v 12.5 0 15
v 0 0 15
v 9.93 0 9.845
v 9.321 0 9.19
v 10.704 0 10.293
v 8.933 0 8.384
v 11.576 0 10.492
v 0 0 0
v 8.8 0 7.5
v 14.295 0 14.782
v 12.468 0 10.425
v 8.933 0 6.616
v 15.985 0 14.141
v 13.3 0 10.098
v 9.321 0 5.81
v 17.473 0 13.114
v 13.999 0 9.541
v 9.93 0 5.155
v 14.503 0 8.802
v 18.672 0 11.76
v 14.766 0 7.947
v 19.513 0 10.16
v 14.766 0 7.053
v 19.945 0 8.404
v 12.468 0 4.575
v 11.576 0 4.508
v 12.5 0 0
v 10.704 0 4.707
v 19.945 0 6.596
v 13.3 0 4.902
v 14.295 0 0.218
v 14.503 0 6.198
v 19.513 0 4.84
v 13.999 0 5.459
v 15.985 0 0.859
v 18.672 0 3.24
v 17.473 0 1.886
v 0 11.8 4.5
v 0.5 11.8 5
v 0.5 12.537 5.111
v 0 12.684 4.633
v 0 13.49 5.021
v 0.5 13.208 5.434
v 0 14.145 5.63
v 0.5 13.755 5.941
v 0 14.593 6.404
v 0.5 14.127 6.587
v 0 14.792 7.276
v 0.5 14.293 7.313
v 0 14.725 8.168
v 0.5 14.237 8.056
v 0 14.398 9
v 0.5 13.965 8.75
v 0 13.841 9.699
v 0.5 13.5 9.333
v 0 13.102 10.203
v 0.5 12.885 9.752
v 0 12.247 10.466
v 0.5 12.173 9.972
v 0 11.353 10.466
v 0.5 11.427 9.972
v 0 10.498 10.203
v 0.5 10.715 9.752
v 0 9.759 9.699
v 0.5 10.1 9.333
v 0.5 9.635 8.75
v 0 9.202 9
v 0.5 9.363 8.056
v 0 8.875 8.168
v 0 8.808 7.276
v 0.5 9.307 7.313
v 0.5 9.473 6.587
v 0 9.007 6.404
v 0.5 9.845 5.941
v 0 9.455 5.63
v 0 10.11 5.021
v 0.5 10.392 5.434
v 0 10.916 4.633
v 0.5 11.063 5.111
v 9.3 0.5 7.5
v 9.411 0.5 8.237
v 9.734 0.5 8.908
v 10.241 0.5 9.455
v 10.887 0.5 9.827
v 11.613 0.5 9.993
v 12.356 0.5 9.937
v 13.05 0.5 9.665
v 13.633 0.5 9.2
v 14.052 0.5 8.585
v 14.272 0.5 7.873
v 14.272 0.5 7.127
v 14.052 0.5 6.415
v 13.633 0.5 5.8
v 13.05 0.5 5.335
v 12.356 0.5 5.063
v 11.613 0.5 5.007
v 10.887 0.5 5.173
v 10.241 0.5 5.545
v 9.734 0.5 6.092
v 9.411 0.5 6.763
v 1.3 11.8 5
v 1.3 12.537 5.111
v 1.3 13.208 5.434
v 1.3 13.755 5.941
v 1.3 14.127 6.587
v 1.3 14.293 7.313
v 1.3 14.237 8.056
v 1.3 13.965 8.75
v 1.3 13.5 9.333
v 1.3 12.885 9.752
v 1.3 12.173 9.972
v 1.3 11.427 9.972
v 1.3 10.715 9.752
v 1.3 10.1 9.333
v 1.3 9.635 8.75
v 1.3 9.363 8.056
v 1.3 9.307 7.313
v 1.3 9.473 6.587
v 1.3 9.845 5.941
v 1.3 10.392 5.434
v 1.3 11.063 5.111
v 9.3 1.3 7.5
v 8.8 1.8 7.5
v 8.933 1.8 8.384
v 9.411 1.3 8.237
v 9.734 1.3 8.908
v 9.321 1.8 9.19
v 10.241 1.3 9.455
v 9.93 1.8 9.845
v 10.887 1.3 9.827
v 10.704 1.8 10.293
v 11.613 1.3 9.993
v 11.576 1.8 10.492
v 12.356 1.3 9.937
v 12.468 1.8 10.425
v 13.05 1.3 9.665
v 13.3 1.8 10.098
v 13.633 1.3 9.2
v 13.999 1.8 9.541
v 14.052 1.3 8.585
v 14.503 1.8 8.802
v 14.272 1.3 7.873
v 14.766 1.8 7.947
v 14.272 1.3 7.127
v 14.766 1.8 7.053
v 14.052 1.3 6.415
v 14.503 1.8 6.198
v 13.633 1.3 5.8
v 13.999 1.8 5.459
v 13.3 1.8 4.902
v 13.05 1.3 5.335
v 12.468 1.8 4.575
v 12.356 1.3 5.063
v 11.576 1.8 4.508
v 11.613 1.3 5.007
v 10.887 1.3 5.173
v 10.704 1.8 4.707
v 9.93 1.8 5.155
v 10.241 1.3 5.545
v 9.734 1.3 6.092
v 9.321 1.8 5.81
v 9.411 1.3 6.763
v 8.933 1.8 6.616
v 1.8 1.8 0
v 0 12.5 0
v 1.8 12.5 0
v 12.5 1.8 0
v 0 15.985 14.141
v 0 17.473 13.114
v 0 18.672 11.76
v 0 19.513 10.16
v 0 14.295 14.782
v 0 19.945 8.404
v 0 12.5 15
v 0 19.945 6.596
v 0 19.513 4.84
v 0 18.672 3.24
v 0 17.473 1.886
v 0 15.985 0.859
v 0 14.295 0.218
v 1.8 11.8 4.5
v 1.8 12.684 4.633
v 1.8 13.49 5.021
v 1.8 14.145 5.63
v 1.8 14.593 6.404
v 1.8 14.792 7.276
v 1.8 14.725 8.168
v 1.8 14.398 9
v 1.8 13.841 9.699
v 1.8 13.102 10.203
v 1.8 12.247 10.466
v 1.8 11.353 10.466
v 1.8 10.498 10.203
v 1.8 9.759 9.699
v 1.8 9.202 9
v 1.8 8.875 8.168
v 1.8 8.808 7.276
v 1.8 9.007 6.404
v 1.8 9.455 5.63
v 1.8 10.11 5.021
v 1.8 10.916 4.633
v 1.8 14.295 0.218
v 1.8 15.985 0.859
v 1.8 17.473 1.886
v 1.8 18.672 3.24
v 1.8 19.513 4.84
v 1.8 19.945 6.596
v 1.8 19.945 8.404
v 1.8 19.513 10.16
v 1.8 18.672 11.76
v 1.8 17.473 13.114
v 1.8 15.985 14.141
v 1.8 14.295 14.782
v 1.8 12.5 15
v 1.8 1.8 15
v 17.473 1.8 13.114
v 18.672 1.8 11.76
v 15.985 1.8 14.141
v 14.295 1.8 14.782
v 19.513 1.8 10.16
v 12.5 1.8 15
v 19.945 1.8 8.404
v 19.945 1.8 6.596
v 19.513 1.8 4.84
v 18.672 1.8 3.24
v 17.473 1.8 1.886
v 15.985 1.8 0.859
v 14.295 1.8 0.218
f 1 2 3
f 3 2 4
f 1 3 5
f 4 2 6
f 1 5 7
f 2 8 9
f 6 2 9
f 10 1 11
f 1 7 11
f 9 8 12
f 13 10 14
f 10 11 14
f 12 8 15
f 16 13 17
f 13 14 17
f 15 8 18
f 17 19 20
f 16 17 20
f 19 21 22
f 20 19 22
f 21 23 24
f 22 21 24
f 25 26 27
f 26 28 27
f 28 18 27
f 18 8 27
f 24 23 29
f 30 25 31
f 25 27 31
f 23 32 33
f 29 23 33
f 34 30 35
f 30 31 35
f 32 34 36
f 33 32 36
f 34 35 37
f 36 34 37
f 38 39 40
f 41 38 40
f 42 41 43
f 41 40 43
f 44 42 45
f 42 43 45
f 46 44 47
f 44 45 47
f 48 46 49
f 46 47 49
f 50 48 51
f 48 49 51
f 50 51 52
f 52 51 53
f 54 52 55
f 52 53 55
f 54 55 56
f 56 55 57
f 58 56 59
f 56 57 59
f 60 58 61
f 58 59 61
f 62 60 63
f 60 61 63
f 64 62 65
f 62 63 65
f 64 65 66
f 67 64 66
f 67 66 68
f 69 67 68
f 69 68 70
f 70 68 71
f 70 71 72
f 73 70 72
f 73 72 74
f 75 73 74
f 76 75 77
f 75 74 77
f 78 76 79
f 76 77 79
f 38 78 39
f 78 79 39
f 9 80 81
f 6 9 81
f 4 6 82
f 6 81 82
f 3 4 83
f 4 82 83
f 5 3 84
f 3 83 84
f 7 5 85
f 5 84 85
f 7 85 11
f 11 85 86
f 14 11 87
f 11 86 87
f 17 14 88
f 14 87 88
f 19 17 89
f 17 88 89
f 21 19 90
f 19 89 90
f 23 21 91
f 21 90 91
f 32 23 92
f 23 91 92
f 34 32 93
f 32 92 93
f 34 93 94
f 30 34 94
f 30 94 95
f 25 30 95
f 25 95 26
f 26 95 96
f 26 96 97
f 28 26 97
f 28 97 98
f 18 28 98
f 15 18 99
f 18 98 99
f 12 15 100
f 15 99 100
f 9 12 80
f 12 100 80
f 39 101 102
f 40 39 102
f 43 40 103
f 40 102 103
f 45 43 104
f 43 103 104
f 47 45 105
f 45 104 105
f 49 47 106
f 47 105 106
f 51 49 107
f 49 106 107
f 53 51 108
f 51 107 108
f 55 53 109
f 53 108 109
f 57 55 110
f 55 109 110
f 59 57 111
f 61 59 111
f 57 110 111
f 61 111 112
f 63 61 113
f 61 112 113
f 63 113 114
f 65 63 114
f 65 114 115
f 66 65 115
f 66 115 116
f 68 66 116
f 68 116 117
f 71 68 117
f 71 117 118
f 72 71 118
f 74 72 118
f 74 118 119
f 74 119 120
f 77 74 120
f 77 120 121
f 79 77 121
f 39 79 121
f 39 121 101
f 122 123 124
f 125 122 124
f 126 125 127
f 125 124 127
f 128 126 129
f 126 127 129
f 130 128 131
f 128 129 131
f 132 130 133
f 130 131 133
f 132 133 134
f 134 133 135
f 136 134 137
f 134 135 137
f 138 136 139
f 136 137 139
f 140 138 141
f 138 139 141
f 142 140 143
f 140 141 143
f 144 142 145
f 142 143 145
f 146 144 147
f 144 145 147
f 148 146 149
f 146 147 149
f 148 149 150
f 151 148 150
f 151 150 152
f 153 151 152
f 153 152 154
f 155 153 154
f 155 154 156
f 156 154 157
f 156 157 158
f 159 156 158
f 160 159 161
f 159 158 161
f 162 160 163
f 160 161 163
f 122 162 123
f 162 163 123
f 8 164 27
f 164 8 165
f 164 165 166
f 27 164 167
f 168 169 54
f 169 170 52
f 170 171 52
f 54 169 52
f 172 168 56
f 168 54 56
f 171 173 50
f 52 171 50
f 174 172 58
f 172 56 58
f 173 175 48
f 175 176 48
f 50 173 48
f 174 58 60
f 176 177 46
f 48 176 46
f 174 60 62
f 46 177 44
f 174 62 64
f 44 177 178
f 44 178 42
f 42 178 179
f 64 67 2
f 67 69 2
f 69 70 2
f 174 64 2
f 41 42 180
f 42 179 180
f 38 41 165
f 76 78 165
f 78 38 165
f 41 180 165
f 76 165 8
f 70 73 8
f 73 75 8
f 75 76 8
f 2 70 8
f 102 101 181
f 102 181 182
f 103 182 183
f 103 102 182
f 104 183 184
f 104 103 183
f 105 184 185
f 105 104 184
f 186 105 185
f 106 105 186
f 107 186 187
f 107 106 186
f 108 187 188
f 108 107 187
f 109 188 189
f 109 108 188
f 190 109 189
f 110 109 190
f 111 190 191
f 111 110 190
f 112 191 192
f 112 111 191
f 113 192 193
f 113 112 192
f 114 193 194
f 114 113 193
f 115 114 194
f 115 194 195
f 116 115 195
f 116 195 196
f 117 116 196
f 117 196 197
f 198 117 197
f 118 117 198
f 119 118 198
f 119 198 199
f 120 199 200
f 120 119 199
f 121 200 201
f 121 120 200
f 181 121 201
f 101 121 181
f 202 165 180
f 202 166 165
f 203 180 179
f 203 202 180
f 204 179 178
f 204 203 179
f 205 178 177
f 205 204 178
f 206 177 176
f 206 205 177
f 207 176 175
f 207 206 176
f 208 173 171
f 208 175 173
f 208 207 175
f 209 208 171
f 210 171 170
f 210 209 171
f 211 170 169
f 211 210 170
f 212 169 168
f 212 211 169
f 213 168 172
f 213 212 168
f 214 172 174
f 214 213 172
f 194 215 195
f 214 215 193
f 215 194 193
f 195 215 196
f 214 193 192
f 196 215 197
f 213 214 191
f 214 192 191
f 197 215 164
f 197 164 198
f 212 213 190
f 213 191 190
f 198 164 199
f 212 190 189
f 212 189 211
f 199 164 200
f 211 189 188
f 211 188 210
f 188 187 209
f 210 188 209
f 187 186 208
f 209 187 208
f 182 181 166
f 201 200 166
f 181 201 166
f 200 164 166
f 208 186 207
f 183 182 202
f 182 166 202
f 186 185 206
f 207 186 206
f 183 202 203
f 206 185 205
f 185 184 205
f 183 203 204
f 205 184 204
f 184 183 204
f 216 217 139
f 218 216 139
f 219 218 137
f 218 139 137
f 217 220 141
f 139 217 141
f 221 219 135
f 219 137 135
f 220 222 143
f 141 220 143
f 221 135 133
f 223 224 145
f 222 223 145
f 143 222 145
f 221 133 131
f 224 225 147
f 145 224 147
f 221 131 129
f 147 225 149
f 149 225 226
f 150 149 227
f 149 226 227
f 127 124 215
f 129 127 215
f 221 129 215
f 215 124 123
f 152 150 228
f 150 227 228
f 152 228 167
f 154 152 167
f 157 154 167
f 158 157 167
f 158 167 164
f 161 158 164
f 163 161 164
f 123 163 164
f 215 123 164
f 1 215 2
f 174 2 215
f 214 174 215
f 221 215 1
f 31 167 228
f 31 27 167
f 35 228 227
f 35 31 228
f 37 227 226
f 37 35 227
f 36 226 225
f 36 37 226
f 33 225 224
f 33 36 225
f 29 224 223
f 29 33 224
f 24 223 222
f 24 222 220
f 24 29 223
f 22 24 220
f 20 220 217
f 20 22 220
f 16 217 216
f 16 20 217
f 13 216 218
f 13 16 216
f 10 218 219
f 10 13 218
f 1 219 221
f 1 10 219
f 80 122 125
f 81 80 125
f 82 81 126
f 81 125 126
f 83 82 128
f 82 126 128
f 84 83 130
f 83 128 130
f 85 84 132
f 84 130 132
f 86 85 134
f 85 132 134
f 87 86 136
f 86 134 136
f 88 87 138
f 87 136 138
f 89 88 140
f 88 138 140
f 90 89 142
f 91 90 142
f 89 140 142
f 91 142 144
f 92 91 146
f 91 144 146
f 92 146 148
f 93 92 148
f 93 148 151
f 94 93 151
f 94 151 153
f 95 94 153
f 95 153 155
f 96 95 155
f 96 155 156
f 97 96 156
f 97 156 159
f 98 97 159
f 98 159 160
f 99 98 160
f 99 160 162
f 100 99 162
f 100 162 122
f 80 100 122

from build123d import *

# Parameters (mm, degrees)
BOSS_EXTRUDE1_DEPTH = 15
FILLET1_RADIUS      = 7.5
FILLET1_LENGTH      = 1.8
FILLET2_RADIUS      = 7.5
FILLET2_LENGTH      = 1.8
SKETCH3_R           = 2.5
CUT_EXTRUDE1_DEPTH  = 10
SKETCH2_R           = 2.5
CUT_EXTRUDE2_DEPTH  = 10
CHAMFER1_SIZE       = 0.5


with BuildPart() as part:
    # Sketch1 → Boss-Extrude1 (new body)
    with BuildSketch(Plane.XY):
        Polygon((0, 0), (20, 0), (20, 1.8), (1.8, 1.8), (1.8, 20), (0, 20), align=None)
    extrude(amount=BOSS_EXTRUDE1_DEPTH)

    # Fillet1: full round fillet: the end face becomes a half cylinder, R = half its width
    fillet1_face = Plane((0.9, 20, 7.5), x_dir=(1, 0, 0), z_dir=(0, 1, 0))  # on the end face: x along it, z out of the body
    fillet1_slab = fillet1_face.offset(-FILLET1_RADIUS / 2) * Box(FILLET1_LENGTH, 2 * FILLET1_RADIUS, FILLET1_RADIUS, mode=Mode.PRIVATE)  # the body's end, R deep
    fillet1_round = Plane((0.9, 12.5, 7.5), x_dir=(0, 1, 0), z_dir=(1, 0, 0)) * Cylinder(FILLET1_RADIUS, FILLET1_LENGTH, mode=Mode.PRIVATE)  # its axis R under the face
    add(fillet1_slab - fillet1_round, mode=Mode.SUBTRACT)

    # Fillet2: full round fillet: the end face becomes a half cylinder, R = half its width
    fillet2_face = Plane((20, 0.9, 7.5), x_dir=(0, -1, 0), z_dir=(1, 0, 0))  # on the end face: x along it, z out of the body
    fillet2_slab = fillet2_face.offset(-FILLET2_RADIUS / 2) * Box(FILLET2_LENGTH, 2 * FILLET2_RADIUS, FILLET2_RADIUS, mode=Mode.PRIVATE)  # the body's end, R deep
    fillet2_round = Plane((12.5, 0.9, 7.5), x_dir=(1, 0, 0), z_dir=(0, -1, 0)) * Cylinder(FILLET2_RADIUS, FILLET2_LENGTH, mode=Mode.PRIVATE)  # its axis R under the face
    add(fillet2_slab - fillet2_round, mode=Mode.SUBTRACT)

    # Sketch3 → Cut-Extrude1 (cut)
    with BuildSketch(Plane(origin=(0, 1.8, 0), x_dir=(1, 0, 0), z_dir=(0, 1, 0))):
        with Locations(Location((11.8, -7.5, 0), (0, 0, 180))):
            Circle(SKETCH3_R)
    extrude(amount=-CUT_EXTRUDE1_DEPTH, mode=Mode.SUBTRACT)

    # Sketch2 → Cut-Extrude2 (cut)
    with BuildSketch(Plane(origin=(1.8, 0, 0), x_dir=(0, 0, -1), z_dir=(1, 0, 0))):
        with Locations((-7.5, 11.8)):
            Circle(SKETCH2_R)
    extrude(amount=-CUT_EXTRUDE2_DEPTH, mode=Mode.SUBTRACT)

    # Chamfer1
    chamfer1_edges = [part.edges().sort_by_distance(p)[0] for p in [
        (14.3, 0, 7.5),
        (14.3, 1.8, 7.5),
        (0, 11.8, 10),
        (1.8, 11.8, 10),
    ]]
    chamfer(chamfer1_edges, length=CHAMFER1_SIZE)


solid = part.part
